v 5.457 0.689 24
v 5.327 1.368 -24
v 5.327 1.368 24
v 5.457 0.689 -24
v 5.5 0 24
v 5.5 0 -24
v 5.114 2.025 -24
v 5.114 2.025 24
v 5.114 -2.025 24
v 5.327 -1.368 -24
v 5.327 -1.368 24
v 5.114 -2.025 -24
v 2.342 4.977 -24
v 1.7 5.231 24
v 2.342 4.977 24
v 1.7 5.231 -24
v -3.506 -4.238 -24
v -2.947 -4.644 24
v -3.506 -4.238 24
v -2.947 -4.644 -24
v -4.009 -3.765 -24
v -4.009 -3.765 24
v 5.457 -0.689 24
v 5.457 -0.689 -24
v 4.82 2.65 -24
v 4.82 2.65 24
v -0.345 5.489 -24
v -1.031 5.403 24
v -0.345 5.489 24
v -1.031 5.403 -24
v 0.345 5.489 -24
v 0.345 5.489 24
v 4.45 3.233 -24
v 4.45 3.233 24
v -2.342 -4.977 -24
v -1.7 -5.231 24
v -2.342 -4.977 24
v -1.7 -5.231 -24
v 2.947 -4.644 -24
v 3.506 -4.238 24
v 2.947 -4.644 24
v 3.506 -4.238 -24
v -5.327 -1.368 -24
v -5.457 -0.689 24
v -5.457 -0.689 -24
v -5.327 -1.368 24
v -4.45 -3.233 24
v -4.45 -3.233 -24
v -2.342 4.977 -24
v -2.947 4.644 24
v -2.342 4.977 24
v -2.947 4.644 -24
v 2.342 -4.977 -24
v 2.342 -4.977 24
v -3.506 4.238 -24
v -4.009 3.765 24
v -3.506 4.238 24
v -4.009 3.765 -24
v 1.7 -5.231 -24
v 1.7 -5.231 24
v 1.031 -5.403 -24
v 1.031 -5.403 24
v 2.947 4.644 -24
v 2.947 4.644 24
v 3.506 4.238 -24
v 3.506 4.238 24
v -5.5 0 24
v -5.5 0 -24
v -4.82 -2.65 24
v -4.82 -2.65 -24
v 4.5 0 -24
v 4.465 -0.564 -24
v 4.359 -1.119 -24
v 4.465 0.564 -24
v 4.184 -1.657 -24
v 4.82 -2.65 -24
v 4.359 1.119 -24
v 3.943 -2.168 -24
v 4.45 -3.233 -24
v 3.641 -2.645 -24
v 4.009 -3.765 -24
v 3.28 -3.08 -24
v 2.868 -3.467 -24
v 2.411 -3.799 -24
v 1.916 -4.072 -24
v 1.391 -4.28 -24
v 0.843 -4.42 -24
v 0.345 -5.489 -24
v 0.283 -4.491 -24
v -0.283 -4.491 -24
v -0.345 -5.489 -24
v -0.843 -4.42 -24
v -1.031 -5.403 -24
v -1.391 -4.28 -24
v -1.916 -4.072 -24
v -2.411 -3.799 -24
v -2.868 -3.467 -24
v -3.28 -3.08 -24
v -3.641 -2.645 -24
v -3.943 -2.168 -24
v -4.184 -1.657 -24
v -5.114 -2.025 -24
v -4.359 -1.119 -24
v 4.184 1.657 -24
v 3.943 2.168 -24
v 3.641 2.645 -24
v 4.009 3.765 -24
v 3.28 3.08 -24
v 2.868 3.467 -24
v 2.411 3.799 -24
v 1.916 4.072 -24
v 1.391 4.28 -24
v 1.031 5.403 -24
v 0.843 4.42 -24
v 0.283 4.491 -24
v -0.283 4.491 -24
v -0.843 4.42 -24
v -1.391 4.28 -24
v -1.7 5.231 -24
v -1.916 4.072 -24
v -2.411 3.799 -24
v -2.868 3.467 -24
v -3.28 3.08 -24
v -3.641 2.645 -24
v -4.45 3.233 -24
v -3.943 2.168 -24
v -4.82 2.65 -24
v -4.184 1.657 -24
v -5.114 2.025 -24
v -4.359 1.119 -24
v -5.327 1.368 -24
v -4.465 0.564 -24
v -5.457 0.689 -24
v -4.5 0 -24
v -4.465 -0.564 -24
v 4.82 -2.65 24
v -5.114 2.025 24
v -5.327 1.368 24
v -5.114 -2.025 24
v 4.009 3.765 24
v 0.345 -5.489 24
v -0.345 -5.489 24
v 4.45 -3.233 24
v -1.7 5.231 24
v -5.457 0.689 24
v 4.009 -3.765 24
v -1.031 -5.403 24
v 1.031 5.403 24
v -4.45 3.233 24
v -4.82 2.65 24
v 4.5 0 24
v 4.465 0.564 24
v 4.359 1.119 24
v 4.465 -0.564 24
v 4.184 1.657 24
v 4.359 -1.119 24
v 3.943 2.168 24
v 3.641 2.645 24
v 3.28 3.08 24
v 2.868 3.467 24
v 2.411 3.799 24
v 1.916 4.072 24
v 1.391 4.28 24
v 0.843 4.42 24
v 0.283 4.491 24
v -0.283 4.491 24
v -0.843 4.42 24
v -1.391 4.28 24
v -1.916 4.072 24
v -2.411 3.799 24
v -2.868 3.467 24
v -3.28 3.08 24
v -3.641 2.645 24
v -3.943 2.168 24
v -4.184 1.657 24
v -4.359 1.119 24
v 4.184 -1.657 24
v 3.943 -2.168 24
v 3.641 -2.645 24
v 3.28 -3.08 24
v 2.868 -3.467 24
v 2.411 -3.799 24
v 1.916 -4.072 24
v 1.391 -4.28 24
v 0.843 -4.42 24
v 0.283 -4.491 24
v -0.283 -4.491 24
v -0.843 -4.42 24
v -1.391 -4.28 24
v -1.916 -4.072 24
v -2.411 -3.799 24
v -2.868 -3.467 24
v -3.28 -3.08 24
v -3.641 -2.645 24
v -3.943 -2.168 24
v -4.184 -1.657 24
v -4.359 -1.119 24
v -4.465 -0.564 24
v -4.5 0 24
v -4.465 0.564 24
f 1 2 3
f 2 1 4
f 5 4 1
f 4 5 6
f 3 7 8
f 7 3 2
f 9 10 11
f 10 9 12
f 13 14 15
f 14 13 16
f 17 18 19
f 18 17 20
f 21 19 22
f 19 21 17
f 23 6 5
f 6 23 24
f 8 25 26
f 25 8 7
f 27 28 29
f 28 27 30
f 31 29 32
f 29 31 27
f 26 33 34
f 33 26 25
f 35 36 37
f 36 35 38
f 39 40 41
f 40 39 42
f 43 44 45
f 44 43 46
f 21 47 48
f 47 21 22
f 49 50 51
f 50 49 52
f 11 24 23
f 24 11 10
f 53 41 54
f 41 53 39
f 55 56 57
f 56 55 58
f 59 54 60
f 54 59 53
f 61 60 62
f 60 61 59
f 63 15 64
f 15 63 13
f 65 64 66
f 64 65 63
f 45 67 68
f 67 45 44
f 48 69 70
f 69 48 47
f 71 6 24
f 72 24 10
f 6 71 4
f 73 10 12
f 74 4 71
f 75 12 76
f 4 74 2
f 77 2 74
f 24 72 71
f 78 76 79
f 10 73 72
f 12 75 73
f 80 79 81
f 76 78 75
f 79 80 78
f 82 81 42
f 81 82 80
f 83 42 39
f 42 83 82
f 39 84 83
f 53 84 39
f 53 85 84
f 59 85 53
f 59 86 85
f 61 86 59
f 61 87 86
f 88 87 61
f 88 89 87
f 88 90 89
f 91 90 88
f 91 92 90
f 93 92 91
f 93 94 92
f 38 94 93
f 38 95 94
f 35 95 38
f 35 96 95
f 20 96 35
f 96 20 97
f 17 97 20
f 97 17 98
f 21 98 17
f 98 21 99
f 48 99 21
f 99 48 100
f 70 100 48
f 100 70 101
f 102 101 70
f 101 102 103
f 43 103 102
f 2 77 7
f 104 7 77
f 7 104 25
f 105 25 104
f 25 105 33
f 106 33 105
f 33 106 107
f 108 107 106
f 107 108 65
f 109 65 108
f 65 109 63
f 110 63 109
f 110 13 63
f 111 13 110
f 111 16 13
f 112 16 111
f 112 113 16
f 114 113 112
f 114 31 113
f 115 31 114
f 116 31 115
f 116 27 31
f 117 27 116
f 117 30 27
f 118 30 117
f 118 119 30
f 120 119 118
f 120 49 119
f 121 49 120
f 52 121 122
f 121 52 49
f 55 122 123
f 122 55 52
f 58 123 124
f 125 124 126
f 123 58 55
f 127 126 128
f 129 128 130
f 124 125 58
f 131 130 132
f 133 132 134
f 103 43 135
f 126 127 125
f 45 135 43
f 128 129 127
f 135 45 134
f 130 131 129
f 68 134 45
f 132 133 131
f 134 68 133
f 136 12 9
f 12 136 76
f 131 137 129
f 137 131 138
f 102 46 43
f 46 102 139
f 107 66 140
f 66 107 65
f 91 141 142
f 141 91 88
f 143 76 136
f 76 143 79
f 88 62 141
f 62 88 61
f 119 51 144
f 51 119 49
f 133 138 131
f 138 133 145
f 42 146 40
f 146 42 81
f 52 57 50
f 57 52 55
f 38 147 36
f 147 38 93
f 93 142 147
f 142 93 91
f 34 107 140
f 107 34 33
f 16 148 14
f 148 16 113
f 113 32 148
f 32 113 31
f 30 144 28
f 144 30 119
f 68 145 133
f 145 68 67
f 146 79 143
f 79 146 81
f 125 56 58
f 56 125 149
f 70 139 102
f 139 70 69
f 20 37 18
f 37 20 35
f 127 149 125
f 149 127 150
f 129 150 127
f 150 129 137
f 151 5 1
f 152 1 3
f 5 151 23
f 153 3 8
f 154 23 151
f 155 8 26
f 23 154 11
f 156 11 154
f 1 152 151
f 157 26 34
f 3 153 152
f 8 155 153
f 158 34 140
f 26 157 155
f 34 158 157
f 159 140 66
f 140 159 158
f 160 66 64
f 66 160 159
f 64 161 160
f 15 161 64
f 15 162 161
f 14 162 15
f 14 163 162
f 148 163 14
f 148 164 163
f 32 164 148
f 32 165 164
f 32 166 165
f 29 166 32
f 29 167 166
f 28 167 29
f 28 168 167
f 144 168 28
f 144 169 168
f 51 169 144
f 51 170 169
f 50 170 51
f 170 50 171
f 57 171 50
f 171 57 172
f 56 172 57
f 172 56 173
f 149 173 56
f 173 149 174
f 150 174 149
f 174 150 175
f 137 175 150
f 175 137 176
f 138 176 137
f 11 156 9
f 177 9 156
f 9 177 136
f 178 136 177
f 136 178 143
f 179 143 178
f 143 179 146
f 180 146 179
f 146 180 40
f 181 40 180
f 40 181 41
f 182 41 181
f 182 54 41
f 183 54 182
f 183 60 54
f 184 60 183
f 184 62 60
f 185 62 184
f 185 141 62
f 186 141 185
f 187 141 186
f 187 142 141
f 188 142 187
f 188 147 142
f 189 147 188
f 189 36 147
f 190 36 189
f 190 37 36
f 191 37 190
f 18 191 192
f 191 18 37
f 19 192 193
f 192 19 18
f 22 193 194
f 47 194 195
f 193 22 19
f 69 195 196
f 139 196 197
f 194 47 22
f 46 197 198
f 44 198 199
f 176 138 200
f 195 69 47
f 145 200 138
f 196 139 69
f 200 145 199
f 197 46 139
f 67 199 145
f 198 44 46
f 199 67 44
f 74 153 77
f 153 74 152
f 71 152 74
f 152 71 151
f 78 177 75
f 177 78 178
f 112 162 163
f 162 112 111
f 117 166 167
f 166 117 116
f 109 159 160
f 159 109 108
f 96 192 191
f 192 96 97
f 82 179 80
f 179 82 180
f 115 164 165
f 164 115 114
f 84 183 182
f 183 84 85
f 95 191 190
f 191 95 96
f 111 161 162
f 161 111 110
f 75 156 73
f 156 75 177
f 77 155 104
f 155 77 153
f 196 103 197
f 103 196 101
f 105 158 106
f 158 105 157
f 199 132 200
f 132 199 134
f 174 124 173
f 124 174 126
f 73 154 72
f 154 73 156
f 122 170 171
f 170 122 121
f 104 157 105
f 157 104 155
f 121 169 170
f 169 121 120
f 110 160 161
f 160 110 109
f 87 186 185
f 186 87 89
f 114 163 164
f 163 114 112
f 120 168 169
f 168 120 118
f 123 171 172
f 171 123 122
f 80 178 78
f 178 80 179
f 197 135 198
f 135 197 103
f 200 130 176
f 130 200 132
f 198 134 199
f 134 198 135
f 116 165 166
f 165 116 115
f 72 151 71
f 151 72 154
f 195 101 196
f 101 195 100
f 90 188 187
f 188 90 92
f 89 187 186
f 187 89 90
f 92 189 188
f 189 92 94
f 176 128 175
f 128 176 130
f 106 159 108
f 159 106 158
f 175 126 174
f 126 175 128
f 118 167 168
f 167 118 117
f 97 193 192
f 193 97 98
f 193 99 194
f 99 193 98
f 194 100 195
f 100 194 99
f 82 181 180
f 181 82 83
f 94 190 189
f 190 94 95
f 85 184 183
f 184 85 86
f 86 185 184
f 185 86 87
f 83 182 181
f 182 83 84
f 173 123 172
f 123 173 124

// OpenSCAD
$fn = 50;


difference() {
	union() {
		translate(v = [0, 0, -24.0000000000]) {
			cylinder(h = 48, r = 5.5000000000);
		}
	}
	union() {
		translate(v = [0, 0, -100.0000000000]) {
			cylinder(h = 200, r = 4.5000000000);
		}
	}
}
